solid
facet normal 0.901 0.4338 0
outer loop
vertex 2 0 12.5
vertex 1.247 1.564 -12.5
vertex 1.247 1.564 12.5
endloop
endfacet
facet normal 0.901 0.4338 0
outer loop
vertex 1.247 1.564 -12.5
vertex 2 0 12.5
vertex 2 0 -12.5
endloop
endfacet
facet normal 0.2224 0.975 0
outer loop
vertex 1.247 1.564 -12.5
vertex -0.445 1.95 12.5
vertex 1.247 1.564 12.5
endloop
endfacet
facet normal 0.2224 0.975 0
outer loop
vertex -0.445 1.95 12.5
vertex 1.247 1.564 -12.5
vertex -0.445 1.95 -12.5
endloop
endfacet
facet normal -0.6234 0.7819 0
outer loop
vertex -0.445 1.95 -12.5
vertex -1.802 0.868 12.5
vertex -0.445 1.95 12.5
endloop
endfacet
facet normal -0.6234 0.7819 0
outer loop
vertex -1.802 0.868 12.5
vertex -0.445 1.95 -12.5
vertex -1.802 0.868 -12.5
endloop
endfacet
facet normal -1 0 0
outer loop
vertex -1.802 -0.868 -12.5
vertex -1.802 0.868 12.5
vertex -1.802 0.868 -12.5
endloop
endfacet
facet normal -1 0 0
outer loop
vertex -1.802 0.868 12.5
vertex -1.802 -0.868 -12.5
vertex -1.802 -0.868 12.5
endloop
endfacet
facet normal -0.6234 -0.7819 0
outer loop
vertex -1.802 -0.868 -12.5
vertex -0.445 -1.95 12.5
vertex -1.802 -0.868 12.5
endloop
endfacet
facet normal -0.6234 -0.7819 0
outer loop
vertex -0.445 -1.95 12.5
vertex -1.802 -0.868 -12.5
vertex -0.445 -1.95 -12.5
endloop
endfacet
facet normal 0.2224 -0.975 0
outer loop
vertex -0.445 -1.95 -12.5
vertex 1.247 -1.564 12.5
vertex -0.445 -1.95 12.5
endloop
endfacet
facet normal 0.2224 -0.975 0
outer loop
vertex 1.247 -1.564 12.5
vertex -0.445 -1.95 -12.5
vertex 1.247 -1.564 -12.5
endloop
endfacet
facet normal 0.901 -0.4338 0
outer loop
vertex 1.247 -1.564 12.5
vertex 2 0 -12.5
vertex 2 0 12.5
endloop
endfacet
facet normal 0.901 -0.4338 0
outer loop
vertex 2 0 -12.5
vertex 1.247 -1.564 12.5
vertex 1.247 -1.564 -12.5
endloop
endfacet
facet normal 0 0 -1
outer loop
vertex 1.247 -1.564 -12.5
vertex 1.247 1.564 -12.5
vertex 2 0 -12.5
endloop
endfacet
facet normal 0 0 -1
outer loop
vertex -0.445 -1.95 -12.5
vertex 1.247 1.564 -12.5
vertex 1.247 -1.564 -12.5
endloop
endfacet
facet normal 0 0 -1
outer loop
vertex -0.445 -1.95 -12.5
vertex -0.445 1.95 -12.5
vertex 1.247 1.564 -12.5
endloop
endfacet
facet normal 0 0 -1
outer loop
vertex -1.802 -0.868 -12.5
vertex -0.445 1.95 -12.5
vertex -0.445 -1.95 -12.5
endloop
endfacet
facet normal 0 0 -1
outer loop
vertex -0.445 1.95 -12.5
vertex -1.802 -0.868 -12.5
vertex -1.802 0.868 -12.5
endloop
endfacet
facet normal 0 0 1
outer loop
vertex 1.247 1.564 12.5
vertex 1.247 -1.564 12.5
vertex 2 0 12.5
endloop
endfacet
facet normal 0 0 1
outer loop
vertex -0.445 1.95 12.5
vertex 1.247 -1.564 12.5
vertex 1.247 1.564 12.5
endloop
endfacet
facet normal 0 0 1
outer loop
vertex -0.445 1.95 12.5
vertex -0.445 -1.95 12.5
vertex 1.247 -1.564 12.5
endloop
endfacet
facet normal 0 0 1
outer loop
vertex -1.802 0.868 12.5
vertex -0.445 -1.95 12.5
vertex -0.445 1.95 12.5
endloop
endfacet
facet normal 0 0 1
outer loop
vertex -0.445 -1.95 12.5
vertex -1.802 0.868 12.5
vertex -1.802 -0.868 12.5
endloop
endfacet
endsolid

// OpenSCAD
// Generated by generate_scads.py
cylinder(h=25, r=2, center=true);
